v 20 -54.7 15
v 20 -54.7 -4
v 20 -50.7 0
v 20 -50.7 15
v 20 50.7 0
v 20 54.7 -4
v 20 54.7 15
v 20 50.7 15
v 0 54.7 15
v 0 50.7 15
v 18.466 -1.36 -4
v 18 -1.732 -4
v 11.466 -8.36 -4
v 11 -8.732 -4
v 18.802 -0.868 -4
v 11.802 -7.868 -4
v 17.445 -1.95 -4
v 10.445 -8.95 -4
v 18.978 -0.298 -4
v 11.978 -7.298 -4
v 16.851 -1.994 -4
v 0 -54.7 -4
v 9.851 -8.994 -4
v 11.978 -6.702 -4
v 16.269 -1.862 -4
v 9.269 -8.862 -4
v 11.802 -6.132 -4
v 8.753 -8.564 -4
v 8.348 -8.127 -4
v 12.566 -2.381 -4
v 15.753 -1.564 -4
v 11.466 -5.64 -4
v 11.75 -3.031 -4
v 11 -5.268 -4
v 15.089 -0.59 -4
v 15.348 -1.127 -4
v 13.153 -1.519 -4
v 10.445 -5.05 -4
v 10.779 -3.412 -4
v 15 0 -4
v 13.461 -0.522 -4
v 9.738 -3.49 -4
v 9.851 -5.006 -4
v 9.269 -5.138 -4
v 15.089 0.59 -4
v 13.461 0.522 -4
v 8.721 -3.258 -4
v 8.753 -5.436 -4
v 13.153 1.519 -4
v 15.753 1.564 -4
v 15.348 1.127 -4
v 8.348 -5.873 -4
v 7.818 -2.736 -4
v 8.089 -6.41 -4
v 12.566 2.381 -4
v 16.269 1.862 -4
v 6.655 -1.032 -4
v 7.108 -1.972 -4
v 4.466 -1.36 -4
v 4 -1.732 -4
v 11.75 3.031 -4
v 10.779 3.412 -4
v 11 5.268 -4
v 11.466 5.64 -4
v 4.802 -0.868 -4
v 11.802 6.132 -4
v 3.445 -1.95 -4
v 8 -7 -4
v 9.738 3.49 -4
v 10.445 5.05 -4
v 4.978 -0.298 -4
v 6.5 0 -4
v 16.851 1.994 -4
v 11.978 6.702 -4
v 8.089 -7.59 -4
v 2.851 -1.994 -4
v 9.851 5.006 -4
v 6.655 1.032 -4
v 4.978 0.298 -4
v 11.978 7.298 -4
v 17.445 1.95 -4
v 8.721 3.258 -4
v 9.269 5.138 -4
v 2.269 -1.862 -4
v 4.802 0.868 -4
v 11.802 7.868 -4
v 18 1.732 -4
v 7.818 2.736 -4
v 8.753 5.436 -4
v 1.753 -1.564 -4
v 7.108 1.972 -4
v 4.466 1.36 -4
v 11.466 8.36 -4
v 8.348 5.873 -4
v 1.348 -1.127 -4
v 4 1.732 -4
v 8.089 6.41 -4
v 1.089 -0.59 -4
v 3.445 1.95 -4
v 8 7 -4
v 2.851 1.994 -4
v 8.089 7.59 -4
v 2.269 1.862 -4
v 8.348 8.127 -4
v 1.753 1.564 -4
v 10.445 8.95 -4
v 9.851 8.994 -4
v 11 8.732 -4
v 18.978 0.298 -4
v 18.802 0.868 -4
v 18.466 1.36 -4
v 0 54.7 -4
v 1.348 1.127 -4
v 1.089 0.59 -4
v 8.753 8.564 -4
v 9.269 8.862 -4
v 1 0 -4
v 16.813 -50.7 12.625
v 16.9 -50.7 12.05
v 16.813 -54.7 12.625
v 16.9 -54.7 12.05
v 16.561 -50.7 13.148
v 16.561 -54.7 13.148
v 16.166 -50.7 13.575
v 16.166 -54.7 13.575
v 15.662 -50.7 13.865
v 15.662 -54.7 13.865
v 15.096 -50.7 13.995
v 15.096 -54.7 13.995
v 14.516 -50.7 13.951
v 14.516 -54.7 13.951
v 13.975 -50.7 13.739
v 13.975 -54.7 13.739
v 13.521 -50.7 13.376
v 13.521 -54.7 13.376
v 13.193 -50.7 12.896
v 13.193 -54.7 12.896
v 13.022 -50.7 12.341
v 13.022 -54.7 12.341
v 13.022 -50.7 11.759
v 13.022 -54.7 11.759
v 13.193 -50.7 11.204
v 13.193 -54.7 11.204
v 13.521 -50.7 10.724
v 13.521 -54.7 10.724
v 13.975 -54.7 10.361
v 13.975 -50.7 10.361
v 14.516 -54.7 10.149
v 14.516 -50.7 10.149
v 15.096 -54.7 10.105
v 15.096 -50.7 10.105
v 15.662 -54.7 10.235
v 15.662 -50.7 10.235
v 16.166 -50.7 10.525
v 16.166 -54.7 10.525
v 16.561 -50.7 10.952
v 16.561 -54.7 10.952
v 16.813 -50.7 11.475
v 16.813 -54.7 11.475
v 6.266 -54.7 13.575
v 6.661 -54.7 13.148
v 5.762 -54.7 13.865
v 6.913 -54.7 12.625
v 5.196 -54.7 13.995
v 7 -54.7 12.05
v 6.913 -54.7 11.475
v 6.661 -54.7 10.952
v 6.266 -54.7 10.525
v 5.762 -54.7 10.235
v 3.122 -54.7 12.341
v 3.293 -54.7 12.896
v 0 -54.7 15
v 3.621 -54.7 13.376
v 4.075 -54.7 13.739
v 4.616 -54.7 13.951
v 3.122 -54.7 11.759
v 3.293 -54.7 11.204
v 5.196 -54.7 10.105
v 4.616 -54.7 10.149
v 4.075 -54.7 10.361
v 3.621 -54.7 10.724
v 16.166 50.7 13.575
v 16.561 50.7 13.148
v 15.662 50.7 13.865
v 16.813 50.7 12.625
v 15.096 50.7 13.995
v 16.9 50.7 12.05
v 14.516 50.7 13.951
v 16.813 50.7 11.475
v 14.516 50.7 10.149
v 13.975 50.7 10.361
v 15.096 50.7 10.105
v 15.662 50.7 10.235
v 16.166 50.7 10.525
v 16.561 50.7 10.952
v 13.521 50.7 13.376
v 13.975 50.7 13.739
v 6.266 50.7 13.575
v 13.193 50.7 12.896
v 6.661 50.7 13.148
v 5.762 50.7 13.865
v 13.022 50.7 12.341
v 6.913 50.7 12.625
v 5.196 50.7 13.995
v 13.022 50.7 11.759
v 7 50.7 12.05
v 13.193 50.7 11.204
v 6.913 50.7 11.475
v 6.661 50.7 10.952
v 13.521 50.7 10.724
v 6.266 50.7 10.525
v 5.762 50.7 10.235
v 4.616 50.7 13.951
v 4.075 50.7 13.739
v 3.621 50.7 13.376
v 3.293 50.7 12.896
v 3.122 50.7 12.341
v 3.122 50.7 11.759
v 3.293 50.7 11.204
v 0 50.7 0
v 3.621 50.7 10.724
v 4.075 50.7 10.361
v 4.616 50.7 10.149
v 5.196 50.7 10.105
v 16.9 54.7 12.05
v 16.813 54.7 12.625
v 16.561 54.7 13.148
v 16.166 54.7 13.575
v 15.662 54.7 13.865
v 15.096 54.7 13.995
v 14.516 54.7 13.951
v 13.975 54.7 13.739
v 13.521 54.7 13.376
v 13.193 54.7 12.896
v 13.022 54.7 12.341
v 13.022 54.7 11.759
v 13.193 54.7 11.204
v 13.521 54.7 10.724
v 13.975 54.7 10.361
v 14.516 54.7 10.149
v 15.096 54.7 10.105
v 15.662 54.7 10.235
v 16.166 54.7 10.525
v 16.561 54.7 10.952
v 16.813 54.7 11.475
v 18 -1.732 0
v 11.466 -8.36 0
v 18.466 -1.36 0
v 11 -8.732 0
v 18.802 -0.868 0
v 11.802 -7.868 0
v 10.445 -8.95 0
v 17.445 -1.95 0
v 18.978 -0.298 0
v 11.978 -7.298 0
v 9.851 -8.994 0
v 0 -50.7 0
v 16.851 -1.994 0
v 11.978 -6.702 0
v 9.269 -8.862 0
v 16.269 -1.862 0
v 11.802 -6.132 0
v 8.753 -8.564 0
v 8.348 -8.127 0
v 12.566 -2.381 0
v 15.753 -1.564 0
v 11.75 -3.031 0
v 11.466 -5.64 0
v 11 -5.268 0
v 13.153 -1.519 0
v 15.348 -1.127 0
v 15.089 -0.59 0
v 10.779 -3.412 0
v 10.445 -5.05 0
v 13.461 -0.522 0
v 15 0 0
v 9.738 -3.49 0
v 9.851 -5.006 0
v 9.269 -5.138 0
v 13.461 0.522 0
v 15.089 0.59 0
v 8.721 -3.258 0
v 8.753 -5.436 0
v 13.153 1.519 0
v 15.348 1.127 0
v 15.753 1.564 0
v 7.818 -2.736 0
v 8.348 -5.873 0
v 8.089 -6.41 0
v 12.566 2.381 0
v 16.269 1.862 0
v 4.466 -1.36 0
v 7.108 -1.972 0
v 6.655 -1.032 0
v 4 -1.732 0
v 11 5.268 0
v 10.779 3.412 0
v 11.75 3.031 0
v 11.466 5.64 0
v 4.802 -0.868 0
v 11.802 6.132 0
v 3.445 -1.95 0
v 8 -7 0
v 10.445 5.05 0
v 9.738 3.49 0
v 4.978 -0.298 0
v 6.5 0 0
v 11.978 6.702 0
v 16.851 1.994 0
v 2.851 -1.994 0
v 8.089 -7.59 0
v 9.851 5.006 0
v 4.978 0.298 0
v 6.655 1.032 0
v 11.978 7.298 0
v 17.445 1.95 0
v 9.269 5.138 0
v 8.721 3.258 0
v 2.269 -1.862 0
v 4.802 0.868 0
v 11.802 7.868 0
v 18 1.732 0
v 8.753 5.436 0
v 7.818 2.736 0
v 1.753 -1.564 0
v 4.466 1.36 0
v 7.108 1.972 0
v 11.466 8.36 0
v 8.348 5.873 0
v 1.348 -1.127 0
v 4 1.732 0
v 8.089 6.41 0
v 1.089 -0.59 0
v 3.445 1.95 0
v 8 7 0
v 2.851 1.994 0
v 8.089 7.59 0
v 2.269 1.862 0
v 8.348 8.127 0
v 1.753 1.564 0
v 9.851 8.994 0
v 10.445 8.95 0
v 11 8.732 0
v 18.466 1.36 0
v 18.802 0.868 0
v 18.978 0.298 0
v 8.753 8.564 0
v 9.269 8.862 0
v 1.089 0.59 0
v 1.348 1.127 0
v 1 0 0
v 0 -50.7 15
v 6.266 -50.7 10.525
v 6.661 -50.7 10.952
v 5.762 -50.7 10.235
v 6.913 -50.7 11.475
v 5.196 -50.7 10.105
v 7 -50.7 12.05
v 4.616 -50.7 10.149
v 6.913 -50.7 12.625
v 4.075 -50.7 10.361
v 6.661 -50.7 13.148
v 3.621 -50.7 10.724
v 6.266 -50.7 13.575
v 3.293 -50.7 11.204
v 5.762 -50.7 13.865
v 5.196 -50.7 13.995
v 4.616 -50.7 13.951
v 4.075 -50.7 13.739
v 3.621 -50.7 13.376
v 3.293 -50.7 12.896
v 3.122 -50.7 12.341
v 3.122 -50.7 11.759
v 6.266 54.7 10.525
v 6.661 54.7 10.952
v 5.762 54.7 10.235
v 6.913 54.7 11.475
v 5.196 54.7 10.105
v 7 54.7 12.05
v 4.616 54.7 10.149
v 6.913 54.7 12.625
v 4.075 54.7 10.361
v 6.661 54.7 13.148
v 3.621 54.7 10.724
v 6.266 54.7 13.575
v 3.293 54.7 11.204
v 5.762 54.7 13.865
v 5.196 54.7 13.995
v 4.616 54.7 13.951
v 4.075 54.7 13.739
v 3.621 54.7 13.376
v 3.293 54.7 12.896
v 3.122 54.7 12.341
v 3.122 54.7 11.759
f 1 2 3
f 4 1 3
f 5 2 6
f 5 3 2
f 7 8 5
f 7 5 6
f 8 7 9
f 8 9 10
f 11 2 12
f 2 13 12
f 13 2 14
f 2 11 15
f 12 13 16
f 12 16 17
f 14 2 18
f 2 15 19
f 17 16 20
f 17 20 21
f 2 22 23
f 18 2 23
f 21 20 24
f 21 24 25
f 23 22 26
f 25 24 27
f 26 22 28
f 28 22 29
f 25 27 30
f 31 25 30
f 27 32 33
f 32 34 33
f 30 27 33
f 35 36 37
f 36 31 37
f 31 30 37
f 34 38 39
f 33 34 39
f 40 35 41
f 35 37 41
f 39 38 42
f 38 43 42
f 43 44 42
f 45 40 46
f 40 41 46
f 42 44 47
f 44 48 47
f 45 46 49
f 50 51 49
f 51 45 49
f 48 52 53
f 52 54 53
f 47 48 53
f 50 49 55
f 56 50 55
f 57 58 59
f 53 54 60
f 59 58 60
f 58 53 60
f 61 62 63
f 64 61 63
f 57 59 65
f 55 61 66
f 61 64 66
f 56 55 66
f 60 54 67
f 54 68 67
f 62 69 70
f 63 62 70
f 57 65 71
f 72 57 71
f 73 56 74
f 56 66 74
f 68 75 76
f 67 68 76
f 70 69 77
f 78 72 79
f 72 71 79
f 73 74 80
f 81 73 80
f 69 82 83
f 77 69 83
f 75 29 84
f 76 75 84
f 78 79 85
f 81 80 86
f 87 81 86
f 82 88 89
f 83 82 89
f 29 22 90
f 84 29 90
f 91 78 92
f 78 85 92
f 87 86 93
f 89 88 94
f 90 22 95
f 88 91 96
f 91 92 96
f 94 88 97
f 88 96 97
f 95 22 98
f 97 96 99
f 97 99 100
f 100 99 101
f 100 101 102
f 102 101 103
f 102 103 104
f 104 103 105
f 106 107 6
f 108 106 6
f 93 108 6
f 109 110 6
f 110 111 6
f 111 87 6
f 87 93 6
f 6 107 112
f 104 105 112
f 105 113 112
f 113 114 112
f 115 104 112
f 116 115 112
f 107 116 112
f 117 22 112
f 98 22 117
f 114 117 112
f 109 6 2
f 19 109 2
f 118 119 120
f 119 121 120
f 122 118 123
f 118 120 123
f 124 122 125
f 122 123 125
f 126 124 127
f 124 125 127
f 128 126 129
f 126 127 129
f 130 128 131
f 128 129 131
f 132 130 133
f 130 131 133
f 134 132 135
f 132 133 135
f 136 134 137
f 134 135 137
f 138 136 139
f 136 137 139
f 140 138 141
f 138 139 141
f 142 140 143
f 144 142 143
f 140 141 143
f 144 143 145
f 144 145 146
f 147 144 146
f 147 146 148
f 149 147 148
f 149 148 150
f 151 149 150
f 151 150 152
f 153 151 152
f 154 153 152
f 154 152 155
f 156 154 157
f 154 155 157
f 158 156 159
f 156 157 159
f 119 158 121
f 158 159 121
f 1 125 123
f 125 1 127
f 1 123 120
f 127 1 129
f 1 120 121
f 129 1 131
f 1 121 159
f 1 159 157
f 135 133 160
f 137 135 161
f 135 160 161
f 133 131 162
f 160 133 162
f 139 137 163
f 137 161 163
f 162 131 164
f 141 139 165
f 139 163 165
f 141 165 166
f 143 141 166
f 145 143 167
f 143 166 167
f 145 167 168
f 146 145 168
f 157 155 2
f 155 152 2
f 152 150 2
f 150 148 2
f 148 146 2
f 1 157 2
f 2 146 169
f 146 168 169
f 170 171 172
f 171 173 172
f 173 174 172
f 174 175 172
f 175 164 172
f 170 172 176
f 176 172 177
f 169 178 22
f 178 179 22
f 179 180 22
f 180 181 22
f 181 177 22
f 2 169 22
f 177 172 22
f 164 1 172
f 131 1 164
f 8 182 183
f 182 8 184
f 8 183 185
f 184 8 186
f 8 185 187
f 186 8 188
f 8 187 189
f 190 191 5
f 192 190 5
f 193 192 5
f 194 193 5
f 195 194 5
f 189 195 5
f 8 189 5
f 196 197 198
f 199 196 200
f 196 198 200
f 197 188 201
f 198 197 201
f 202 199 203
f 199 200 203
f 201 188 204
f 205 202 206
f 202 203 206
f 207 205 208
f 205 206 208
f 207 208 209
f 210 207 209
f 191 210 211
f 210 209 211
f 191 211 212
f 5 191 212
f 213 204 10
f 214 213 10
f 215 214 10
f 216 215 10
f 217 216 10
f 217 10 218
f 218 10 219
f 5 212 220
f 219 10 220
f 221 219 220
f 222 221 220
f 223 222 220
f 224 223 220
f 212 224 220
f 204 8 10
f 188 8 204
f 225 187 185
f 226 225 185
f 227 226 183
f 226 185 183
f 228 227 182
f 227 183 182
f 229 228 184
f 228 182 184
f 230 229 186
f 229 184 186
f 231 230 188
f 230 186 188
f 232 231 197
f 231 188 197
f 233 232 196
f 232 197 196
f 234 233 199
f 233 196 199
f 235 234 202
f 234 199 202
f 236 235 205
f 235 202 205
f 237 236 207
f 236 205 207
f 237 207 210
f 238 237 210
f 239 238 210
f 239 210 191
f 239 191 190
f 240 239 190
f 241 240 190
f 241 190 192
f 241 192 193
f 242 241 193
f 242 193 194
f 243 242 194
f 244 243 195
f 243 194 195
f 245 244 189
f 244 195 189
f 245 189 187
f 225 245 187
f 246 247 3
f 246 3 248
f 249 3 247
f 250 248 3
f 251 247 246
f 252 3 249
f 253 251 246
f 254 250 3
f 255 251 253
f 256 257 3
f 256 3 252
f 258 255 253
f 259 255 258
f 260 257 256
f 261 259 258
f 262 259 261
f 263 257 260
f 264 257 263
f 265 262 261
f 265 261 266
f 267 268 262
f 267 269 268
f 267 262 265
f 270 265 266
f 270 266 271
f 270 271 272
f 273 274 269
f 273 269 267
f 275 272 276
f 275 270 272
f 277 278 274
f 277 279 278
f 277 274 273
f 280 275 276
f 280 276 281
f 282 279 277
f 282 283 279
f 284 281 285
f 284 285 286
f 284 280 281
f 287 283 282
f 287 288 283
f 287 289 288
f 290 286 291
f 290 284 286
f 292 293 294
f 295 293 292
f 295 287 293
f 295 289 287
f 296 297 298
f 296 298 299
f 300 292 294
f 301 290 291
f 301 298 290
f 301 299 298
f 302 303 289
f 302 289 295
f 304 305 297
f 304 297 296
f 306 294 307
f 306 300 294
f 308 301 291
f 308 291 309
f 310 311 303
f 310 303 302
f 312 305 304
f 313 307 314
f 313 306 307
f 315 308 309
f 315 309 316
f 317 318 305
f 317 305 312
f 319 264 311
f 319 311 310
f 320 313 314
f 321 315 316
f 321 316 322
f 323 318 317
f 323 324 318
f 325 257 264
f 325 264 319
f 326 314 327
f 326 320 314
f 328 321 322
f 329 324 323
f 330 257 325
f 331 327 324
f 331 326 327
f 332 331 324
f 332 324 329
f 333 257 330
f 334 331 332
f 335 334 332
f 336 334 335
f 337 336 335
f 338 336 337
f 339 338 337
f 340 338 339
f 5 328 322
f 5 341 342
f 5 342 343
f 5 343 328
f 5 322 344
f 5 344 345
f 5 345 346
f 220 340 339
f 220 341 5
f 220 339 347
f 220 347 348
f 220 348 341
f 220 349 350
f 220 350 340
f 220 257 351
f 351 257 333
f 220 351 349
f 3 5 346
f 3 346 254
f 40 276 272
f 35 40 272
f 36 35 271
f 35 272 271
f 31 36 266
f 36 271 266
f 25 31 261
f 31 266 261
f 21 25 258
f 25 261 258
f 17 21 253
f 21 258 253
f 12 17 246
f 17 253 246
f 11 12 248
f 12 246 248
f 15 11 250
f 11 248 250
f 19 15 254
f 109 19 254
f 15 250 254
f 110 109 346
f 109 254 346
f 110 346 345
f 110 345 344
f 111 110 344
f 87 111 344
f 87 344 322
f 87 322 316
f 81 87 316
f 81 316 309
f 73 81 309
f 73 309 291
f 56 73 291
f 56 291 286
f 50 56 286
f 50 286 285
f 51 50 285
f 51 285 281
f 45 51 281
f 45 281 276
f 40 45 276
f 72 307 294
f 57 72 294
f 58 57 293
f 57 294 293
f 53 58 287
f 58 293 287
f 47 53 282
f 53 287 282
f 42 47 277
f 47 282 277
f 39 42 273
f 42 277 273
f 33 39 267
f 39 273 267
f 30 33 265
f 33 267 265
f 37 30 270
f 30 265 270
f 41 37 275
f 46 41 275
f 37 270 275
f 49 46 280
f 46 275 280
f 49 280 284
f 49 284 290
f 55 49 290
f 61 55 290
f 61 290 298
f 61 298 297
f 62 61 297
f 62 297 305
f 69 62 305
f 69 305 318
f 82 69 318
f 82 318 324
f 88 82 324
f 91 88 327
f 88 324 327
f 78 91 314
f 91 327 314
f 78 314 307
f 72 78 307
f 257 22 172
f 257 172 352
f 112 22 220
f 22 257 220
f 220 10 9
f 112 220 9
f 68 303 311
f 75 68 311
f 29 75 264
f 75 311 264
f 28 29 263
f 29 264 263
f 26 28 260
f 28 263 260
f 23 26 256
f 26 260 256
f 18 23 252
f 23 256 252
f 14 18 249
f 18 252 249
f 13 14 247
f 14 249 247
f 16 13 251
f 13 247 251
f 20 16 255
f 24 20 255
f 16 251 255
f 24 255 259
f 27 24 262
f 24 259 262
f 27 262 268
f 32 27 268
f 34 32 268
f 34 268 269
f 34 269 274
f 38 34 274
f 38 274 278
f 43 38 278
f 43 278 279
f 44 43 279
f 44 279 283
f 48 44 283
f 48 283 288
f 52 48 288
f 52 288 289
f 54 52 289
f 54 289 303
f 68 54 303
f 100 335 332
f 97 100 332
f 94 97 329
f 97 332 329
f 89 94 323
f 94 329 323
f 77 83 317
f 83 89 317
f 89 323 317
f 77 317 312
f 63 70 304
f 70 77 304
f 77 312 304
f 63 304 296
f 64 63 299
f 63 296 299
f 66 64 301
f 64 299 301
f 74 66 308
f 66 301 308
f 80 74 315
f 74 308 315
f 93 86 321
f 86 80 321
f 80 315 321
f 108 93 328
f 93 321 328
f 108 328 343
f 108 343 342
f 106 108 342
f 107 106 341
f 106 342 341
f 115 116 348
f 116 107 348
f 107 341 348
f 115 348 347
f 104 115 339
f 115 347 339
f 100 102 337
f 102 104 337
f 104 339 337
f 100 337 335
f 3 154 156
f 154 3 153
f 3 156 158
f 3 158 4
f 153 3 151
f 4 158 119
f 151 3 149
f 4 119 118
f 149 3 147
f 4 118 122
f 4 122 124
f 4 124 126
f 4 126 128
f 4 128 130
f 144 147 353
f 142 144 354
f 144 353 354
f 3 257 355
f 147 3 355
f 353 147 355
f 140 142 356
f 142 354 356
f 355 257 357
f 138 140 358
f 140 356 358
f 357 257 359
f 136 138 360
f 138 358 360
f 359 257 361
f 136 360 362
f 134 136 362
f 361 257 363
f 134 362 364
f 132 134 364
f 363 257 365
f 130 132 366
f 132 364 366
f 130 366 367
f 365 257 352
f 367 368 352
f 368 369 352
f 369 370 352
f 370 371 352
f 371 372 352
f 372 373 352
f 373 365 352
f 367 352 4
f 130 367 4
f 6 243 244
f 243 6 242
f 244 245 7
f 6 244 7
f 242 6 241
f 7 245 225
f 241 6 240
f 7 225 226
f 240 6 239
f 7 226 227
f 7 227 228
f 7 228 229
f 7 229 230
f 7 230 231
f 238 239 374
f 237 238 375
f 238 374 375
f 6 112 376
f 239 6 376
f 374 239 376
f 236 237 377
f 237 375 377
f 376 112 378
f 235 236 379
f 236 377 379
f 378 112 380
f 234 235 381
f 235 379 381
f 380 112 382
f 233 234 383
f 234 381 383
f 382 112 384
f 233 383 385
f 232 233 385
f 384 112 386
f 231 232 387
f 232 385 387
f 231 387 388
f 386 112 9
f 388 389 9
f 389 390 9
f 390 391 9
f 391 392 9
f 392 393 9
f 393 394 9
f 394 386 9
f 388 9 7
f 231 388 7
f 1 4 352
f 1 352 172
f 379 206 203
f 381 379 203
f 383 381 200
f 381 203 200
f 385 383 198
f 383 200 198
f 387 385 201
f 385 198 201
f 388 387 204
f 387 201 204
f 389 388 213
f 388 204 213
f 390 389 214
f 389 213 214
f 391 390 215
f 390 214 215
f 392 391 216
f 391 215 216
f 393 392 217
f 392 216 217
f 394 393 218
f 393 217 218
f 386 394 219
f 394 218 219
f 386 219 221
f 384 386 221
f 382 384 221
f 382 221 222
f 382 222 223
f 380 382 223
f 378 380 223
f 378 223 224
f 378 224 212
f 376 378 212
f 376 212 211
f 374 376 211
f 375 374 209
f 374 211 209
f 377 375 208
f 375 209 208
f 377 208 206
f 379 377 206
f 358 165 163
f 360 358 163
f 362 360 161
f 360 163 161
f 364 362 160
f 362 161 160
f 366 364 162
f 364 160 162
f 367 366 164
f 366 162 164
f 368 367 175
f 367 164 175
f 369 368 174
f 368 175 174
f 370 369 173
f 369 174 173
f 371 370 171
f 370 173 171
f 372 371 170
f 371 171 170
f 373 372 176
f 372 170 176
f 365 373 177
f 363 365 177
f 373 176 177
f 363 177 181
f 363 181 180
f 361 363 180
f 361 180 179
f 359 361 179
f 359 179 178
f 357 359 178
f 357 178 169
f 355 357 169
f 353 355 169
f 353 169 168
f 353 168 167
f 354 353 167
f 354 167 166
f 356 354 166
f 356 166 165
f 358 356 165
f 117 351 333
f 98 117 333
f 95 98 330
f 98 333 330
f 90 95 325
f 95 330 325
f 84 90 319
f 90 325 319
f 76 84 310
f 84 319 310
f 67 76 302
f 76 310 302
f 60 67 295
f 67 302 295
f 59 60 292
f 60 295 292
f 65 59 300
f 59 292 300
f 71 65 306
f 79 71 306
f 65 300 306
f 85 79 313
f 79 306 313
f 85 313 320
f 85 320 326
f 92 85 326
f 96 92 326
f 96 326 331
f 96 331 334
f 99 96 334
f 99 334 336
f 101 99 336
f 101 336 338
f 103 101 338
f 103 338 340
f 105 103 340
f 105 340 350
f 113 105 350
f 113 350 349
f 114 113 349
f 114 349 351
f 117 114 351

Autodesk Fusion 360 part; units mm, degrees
sketch "Sketch1" plane through (0, 0, 0) normal (1, 0, 0) x (0, 1, 0)
  line L0 (-50.7, 0) -> (50.7, 0)
  line L1 (-50.7, 0) -> (-50.7, 15)
  line L2 (-50.7, 15) -> (-54.7, 15)
  line L3 (-54.7, 15) -> (-54.7, -4)
  line L4 (-54.7, -4) -> (54.7, -4)
  line L5 (54.7, -4) -> (54.7, 15)
  line L6 (54.7, 15) -> (50.7, 15)
  line L7 (50.7, 15) -> (50.7, 0)
  dimension "d1" = 101.4
  dimension "d2" = 15
  dimension "d3" = 4
  dimension "d4" = 4
  dimension "d5" = 4
extrude "Extrude1" add sketch "Sketch1" along normal blind 20
sketch "Sketch2" plane through (0, -54.7, 0) normal (0, -1, 0) x (1, 0, 0)
  line L0 (0, 15) -> (0, -4)
  line L1 (0, -4) -> (20, -4)
  line L2 (20, -4) -> (20, 15)
  line L3 (20, 15) -> (0, 15)
  line L4 (7, 12.05) -> (13, 12.05)
  line L5 (3.1, 12.05) -> (16.9, 12.05)
  circle A0 centre (5.05, 12.05) radius 1.95
  circle A1 centre (14.95, 12.05) radius 1.95
  line L6 (10, 12.05) -> (10, 15)
  line L7 (5.05, 14) -> (10, 14)
  dimension "d8" = 6
  dimension "d9" = 13.8
  dimension "d10" = 1
extrude "Extrude2" cut sketch "Sketch2" against normal blind 109.4 contours L5 A1 | L5 A1 | L5 A0 | L5 A0
sketch "Sketch3" plane through (0, 0, 0) normal (0, 0, 1) x (-1, 0, 0)
  line L0 (0, -50.7) -> (0, 50.7)
  line L1 (0, 50.7) -> (-20, 50.7)
  line L2 (-20, 50.7) -> (-20, -50.7)
  line L3 (-20, -50.7) -> (0, -50.7)
  line L4 (0, 0) -> (-20, 0)
  line L5 (-10, 0) -> (-10, -5.6)
  line L6 (-10, 0) -> (-10, -8.4)
  circle A0 centre (-10, -7) radius 1.4
  circle A1 centre (-10, -7) radius 2
  circle A2 centre (-3, 0) radius 2
  circle A3 centre (-10, 7) radius 2
  circle A4 centre (-17, 0) radius 2
  circle A5 centre (-10, 0) radius 3.5
  dimension "d13" = 5.6
  dimension "d14" = 8.4
  dimension "d15" = 4
  dimension "d17" = 360
  dimension "d20" = 7
extrude "Extrude3" cut sketch "Sketch3" against normal blind 4 contours L6 A0 | L6 A0 | A1 | L4 A2 | L4 A2 | L4 A4 | L4 A4 | L4 L5 L6 A5 | L4 A5 | L4 L5 L6 A5 | A3
equation "d13 = ( 11.2 / 2 ) * 1 mm"
equation "d14 = ( 16.8 / 2 ) * 1 mm"
